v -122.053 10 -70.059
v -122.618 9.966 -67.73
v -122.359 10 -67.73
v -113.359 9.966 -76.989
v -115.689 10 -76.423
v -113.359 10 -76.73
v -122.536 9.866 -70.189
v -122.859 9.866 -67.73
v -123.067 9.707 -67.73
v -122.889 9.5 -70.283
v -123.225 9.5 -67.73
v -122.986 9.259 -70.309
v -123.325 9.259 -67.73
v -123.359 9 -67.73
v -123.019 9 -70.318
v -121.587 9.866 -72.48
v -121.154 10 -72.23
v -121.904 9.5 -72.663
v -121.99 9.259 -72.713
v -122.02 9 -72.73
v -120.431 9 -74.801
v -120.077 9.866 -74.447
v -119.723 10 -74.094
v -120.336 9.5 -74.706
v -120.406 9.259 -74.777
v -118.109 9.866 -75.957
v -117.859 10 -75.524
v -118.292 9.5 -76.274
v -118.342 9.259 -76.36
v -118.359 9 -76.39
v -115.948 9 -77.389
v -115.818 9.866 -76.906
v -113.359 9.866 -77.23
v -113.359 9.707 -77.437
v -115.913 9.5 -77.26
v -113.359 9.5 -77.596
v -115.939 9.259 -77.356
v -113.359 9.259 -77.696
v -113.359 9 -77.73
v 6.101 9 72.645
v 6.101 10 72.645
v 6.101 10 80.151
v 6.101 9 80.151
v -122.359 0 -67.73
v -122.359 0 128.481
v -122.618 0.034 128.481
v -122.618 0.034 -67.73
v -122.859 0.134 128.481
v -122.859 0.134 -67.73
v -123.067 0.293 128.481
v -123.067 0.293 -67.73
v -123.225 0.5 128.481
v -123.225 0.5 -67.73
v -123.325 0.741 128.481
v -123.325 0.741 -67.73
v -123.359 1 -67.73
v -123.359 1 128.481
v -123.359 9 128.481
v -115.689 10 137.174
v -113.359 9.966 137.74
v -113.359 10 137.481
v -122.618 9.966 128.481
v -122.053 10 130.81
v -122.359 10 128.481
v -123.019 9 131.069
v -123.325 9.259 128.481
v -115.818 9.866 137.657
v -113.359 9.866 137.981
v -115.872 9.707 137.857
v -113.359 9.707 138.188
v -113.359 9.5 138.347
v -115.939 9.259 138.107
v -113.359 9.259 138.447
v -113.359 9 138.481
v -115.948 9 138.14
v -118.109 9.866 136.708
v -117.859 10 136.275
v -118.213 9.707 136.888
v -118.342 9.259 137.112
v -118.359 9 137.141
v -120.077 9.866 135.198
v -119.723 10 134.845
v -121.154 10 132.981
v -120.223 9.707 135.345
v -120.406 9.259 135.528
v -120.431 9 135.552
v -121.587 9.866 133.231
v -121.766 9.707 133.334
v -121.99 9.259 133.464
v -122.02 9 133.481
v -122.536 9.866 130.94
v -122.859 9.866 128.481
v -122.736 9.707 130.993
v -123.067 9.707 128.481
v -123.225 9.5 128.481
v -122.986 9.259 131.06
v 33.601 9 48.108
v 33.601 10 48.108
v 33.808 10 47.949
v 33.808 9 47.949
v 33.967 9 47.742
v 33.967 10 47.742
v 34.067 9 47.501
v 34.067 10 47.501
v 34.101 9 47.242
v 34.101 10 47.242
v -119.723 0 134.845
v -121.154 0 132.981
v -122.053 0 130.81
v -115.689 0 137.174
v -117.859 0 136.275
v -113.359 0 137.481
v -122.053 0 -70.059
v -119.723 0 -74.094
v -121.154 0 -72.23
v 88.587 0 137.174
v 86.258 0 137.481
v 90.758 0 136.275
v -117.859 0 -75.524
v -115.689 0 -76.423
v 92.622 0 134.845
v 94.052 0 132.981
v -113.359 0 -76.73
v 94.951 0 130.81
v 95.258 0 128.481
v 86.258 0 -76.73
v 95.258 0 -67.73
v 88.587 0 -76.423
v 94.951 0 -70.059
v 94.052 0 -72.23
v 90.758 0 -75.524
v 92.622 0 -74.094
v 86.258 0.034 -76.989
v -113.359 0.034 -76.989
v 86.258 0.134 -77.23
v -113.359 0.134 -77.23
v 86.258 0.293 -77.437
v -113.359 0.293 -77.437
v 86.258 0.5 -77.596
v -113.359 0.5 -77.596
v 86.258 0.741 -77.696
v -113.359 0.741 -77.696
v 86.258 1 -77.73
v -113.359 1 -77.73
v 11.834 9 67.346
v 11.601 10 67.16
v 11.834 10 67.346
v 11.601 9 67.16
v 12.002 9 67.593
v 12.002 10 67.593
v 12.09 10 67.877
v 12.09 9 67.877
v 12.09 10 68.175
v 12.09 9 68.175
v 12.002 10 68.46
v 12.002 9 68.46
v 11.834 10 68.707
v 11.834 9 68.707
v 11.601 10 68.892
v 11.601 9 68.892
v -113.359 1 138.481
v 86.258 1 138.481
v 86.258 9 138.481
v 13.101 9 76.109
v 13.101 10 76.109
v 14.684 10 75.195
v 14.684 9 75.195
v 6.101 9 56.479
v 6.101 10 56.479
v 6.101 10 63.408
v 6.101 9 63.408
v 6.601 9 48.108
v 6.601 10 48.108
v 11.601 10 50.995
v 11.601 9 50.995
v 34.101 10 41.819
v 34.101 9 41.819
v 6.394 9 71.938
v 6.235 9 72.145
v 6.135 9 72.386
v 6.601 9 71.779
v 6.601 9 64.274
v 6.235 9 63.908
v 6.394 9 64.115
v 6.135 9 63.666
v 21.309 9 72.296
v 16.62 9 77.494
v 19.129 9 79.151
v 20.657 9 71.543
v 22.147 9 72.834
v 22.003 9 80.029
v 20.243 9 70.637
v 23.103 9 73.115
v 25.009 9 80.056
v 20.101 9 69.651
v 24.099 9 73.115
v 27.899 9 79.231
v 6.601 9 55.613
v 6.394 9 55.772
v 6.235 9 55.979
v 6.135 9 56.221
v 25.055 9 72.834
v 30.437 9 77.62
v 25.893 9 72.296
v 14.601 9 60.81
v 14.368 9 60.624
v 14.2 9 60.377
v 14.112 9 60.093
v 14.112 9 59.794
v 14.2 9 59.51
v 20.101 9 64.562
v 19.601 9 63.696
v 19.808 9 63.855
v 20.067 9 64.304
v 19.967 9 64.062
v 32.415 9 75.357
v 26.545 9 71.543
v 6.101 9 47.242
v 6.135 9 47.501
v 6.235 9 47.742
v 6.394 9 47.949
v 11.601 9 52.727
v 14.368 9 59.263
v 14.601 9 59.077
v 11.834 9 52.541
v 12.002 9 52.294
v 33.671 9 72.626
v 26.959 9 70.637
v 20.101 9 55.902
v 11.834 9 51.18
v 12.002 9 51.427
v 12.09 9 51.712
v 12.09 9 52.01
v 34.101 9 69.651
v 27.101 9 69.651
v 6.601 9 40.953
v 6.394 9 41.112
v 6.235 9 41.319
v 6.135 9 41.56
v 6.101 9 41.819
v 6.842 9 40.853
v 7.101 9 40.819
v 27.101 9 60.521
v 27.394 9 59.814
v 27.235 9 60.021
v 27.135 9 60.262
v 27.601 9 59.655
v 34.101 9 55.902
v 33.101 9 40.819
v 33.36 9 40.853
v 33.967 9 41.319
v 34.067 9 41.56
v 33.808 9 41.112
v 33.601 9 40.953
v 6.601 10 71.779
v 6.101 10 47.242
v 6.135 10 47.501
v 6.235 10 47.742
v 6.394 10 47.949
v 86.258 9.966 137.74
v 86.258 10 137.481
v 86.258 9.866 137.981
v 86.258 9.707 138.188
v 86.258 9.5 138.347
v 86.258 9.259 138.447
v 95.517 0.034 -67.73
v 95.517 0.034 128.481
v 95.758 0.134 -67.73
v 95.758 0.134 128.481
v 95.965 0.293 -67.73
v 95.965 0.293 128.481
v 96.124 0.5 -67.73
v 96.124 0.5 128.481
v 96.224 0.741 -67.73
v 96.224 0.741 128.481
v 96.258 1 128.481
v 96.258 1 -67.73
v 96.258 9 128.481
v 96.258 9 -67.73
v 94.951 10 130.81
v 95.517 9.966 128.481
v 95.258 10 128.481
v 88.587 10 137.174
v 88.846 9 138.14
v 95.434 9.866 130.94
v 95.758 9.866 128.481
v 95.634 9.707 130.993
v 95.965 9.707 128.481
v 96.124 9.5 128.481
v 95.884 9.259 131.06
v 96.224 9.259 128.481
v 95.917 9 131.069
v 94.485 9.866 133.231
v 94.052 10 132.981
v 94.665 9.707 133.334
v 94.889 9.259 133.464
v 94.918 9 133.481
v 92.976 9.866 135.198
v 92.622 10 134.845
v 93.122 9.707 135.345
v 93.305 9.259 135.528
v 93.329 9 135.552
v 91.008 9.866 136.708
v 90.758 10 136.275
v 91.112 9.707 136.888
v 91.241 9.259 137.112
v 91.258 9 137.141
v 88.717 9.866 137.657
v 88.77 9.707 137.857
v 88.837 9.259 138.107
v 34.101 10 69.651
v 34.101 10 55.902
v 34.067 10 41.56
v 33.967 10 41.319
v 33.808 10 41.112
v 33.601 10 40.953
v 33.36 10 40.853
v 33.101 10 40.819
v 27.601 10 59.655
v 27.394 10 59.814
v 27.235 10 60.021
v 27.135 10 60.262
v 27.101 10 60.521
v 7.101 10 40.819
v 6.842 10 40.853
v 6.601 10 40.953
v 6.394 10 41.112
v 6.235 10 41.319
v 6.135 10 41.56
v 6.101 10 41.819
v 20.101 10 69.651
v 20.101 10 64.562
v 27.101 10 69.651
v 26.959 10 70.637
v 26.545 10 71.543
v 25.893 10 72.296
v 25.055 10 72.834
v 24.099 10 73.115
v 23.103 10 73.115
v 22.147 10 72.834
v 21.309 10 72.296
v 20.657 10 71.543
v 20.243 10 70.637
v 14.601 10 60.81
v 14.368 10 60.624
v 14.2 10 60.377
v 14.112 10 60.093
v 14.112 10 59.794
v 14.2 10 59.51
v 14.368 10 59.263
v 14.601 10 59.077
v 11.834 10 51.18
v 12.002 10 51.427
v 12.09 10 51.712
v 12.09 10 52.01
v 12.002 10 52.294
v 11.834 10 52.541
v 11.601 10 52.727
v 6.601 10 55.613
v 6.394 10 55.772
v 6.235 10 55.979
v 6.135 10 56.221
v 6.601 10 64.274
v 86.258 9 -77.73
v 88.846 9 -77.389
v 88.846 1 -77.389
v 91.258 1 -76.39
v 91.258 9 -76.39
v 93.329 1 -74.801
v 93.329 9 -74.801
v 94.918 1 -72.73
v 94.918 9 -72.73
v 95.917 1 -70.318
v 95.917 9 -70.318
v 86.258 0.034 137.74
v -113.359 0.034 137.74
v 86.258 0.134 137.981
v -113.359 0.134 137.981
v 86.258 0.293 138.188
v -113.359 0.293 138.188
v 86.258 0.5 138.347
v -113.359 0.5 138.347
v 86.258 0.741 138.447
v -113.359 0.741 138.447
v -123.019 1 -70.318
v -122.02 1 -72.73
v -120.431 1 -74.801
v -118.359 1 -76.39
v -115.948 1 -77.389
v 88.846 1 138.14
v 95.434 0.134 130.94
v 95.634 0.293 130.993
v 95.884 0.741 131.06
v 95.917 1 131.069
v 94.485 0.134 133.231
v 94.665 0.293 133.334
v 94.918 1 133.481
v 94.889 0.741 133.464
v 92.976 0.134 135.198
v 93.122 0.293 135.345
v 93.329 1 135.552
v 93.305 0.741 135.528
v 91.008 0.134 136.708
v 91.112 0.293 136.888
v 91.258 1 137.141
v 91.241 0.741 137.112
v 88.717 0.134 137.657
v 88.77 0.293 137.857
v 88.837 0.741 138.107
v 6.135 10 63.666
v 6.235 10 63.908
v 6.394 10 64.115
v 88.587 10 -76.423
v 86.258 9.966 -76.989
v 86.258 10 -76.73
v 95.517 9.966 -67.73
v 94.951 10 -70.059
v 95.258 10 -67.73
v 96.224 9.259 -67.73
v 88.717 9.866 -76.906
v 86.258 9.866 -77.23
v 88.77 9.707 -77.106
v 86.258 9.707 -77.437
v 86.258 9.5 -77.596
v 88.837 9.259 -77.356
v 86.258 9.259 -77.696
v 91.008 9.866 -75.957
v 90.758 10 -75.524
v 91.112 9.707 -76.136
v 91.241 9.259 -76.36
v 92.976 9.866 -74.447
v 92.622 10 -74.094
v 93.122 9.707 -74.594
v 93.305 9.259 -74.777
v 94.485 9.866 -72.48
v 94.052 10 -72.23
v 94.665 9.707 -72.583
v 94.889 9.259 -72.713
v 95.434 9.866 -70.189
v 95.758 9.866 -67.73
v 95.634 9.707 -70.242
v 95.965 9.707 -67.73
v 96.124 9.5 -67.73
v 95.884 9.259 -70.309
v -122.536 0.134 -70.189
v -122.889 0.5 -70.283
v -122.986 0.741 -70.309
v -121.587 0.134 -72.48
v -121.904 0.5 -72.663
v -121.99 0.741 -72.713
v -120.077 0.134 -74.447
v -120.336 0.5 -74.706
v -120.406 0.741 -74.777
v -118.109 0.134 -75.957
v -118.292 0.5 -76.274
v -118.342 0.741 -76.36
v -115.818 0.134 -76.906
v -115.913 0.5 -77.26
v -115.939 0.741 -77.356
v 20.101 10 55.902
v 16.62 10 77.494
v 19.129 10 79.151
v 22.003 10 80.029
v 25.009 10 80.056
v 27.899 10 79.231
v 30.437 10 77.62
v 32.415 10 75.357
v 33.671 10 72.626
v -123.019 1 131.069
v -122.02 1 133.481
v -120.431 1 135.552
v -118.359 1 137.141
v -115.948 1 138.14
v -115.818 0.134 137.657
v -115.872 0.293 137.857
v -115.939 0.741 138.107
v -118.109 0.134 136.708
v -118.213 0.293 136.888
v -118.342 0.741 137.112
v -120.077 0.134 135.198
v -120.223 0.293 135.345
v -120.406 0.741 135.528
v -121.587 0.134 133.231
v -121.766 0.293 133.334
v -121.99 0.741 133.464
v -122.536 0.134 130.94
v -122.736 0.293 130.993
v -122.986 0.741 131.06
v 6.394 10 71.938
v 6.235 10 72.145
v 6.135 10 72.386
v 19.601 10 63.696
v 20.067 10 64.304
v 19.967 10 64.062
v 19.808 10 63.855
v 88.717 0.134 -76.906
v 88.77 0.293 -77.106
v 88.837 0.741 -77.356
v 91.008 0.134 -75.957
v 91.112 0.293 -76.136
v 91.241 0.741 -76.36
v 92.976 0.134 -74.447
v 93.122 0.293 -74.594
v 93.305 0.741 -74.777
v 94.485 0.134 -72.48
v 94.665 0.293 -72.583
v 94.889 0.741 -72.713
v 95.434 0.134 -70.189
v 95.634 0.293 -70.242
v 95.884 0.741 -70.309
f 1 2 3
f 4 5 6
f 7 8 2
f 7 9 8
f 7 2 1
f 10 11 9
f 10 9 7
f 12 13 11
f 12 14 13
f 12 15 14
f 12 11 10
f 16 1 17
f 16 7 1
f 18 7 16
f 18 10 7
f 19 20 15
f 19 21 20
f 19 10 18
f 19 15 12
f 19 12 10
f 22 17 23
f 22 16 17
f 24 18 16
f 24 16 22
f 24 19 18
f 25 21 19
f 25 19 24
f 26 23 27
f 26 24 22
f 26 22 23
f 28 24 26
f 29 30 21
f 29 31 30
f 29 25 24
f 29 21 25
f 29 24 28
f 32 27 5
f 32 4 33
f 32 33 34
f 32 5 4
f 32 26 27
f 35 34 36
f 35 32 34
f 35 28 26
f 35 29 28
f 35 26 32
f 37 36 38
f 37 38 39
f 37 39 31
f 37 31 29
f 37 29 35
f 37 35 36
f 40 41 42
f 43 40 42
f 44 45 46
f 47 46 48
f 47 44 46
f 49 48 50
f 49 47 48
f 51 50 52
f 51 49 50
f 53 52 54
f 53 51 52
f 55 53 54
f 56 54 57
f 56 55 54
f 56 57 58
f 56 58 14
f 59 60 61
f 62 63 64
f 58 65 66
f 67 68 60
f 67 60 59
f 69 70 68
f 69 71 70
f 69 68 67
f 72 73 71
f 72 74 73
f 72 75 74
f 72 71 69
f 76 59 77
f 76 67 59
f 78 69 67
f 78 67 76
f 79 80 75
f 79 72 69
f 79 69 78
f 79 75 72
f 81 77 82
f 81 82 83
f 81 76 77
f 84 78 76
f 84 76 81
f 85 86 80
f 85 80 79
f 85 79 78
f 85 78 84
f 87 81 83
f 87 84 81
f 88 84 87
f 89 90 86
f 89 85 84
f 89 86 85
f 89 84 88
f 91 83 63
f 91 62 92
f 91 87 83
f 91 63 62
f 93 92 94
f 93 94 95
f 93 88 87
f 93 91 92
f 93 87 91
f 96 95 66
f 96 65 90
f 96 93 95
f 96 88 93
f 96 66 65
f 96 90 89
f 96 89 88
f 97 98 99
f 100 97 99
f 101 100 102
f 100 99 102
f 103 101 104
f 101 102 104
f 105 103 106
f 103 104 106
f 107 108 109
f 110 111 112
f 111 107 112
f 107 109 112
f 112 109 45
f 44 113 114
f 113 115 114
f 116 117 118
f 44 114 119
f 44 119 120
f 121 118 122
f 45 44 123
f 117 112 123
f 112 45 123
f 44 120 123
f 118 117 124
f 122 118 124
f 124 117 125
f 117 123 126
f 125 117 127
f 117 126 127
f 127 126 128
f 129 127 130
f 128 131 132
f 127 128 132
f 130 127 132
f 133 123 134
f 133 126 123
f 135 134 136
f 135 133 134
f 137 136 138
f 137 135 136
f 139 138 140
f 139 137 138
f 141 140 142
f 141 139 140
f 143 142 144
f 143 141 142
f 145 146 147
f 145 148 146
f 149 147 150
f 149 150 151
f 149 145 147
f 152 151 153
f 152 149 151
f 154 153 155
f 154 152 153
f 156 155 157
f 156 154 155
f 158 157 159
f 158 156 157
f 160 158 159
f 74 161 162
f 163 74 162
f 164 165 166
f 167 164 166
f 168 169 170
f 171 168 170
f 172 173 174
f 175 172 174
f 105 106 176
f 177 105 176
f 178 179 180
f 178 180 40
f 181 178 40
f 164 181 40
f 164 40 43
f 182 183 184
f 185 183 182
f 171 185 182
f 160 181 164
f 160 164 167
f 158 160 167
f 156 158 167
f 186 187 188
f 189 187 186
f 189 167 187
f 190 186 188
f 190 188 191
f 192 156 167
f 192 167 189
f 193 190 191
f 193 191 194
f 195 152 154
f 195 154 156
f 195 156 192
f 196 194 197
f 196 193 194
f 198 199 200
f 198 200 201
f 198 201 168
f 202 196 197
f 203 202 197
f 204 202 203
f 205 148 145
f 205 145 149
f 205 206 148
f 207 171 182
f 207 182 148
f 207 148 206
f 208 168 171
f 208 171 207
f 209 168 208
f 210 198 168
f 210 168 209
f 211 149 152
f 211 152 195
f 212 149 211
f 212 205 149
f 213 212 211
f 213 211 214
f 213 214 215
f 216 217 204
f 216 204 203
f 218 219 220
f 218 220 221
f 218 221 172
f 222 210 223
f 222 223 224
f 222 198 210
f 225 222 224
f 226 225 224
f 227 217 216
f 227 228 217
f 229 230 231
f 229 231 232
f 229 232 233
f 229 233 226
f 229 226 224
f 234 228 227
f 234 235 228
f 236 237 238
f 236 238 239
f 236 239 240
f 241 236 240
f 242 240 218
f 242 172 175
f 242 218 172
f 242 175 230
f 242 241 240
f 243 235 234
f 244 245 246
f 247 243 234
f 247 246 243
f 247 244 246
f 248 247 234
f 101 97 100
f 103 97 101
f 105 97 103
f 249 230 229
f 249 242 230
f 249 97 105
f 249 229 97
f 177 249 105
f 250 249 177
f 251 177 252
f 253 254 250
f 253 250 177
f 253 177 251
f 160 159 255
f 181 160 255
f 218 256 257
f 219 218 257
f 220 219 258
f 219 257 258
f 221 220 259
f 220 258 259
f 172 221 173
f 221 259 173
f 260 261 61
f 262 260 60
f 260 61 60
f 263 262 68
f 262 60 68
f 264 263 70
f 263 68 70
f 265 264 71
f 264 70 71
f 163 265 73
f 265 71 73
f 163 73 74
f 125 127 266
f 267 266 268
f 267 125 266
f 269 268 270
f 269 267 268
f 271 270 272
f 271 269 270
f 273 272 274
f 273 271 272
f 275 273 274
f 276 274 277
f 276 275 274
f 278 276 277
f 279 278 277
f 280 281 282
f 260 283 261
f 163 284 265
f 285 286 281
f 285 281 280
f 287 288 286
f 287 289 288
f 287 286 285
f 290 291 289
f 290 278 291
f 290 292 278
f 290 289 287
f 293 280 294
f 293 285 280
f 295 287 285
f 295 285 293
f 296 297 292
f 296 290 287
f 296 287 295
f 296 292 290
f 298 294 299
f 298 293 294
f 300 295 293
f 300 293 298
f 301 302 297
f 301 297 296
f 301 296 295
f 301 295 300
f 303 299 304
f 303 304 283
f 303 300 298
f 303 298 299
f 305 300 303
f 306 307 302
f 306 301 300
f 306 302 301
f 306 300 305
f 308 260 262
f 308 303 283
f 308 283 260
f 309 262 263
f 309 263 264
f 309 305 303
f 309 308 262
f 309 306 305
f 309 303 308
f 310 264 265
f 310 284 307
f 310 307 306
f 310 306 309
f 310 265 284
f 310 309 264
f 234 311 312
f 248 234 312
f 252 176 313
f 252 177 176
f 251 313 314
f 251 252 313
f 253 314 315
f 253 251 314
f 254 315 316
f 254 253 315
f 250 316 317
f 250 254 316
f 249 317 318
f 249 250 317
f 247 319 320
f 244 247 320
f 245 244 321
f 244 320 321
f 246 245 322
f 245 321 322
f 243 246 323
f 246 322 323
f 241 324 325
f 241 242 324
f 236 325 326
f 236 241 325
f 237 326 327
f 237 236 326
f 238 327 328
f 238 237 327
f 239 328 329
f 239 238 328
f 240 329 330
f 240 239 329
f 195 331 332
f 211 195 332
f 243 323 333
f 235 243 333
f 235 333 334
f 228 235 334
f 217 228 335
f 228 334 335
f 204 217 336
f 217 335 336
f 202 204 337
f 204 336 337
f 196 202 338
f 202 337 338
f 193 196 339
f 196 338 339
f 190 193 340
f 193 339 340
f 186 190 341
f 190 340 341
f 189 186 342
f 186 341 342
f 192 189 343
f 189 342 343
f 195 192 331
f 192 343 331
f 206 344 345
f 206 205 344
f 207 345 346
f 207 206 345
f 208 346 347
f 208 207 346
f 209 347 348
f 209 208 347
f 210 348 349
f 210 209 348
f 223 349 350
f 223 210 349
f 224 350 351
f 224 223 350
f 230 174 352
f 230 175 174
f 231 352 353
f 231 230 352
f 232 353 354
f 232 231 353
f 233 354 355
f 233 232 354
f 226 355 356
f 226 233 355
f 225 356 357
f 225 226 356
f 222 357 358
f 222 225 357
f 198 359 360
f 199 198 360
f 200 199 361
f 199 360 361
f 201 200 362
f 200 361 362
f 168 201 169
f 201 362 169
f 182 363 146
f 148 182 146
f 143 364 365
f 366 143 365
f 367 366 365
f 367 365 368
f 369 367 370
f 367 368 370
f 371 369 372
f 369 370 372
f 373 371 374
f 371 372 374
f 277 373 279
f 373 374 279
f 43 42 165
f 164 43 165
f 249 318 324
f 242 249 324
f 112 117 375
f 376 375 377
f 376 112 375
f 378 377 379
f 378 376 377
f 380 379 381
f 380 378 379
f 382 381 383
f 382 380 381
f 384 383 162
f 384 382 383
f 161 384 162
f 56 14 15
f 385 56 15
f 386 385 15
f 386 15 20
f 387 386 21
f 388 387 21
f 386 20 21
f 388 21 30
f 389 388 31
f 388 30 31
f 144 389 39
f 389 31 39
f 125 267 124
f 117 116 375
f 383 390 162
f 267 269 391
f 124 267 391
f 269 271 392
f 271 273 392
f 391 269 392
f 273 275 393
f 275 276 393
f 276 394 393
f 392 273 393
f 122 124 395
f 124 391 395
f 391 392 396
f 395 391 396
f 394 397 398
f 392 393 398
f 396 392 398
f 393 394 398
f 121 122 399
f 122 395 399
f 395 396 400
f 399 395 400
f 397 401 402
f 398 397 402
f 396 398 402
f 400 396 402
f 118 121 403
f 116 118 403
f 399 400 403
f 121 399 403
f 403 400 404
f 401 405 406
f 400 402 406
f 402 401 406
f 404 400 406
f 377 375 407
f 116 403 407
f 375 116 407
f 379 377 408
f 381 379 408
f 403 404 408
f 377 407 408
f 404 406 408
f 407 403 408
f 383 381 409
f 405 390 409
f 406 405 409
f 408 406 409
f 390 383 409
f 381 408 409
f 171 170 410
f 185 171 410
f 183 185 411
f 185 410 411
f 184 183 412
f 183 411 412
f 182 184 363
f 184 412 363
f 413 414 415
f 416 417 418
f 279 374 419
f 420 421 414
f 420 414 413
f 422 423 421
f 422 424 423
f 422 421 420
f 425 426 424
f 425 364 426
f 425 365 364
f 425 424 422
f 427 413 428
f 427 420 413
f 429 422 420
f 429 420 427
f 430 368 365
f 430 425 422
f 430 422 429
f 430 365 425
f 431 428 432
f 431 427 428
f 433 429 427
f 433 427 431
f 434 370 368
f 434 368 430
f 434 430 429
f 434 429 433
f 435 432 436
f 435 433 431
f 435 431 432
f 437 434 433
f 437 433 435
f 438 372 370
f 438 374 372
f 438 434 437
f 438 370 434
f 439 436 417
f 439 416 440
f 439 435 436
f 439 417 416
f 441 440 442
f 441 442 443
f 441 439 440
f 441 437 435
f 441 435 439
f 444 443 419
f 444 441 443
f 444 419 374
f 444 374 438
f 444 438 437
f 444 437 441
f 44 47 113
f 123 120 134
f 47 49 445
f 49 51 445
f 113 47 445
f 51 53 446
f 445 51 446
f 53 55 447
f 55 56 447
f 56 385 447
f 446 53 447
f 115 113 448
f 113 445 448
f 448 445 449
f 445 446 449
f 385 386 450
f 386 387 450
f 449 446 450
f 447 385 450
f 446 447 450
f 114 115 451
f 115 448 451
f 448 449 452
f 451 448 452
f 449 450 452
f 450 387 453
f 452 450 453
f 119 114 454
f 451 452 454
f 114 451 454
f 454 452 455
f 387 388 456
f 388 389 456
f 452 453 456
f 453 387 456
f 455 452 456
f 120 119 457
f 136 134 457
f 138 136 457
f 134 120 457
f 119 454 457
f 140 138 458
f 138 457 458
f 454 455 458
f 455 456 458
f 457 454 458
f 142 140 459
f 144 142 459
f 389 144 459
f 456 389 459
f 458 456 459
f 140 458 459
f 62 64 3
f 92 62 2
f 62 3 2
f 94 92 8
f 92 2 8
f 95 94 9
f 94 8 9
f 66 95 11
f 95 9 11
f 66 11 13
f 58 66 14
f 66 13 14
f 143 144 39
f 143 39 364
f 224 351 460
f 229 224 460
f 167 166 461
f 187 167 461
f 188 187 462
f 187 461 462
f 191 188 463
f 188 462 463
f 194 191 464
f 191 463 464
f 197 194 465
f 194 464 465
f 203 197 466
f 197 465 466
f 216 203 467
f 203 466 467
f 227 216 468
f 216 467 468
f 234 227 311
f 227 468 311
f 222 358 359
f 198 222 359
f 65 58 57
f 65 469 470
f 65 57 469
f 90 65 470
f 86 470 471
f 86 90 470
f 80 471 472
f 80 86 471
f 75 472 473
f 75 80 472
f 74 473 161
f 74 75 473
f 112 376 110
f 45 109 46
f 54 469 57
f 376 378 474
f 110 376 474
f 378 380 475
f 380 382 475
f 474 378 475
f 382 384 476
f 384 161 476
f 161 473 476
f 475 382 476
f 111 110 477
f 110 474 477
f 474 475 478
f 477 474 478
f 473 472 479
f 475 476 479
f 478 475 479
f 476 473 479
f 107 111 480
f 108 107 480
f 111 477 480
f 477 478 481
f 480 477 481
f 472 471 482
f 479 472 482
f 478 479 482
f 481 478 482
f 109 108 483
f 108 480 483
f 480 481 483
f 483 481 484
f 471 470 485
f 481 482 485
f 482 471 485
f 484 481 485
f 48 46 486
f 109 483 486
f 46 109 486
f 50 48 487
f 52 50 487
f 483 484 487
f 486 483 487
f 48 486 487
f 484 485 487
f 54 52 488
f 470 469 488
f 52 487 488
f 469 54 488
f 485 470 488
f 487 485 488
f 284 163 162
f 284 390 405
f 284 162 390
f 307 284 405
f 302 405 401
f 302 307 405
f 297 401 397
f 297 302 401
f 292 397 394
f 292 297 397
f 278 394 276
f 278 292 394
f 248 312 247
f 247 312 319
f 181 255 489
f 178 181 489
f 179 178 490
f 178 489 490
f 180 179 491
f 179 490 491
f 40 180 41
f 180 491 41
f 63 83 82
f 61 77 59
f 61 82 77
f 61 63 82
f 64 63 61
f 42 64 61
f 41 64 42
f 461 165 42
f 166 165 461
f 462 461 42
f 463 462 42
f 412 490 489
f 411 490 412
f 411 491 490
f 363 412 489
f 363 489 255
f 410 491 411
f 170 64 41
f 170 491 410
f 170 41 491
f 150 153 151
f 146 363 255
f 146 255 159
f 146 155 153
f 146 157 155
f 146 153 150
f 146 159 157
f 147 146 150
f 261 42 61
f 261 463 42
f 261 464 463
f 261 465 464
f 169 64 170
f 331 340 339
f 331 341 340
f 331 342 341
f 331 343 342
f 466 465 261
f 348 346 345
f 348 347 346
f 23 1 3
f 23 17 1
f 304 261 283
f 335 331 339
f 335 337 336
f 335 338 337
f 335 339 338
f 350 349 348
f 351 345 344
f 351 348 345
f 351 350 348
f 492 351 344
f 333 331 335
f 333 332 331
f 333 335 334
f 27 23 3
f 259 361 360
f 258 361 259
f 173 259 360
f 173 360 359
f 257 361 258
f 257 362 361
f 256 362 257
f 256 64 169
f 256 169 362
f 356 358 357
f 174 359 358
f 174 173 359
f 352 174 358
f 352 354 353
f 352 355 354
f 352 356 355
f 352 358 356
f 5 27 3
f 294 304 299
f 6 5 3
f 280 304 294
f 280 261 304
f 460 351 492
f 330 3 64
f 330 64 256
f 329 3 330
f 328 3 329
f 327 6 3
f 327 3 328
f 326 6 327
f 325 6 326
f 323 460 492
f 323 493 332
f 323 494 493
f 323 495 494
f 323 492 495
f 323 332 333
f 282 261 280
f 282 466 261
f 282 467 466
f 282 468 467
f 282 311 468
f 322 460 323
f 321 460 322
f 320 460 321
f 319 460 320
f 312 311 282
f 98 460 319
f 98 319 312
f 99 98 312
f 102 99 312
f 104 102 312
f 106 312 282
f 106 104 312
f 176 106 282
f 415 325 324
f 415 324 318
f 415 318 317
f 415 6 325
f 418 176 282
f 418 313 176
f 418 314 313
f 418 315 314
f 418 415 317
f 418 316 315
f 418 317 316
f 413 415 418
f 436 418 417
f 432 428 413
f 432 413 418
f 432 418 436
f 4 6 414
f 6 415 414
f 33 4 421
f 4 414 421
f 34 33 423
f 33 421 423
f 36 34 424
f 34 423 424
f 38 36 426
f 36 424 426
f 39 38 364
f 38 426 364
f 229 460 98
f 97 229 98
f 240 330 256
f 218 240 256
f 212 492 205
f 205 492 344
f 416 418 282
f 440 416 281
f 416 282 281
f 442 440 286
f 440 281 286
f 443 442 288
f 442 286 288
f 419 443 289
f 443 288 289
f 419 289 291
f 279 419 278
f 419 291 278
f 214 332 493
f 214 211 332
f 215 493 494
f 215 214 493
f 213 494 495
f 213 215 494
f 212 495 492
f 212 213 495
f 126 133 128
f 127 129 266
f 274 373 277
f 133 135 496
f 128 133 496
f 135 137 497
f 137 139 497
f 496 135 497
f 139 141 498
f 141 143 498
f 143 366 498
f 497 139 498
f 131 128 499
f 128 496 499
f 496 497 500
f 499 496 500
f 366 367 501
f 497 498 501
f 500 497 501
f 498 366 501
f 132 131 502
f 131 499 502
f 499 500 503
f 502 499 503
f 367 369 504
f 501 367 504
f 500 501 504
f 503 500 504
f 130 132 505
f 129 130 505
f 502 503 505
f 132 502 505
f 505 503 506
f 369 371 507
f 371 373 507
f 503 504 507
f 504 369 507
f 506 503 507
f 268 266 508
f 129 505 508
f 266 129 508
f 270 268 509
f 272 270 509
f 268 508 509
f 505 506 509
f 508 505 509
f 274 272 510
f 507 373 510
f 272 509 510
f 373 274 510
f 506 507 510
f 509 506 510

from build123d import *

# Parameters (mm, degrees)
SKETCH1_W           = 219.61751697
SKETCH1_H           = 216.210653226
BOSS_EXTRUDE1_DEPTH = 10
CUT_EXTRUDE1_DEPTH  = 1
FILLET3_R           = 10
FILLET4_R           = 1


with BuildPart() as part:
    # Sketch1 → Boss-Extrude1 (new body)
    with BuildSketch(Plane(origin=(0, 0, 0), x_dir=(1, 0, 0), z_dir=(0, 1, 0))):
        with Locations((-13.550693969, -30.37560711)):
            Rectangle(SKETCH1_W, SKETCH1_H)
    extrude(amount=BOSS_EXTRUDE1_DEPTH)

    # Sketch2 → Cut-Extrude1 (cut)
    with BuildSketch(Plane(origin=(0, 10, 0), x_dir=(1, 0, 0), z_dir=(0, 1, 0))):
        with BuildLine():
            Line((34.100948693, -47.24181379), (34.100948693, -40.819164059))
            Line((34.100948693, -40.819164059), (6.100948693, -40.819164059))
            Line((6.100948693, -40.819164059), (6.100948693, -47.24181379))
            ThreePointArc((6.100948693, -47.24181379), (6.234923289, -47.74181379), (6.600948693, -48.107839194))
            Line((6.600948693, -48.107839194), (13.100948693, -51.860615944))
            Line((13.100948693, -51.860615944), (20.100948693, -55.902067828))
            Line((20.100948693, -55.902067828), (33.600948693, -48.107839194))
            ThreePointArc((33.600948693, -48.107839194), (33.966974097, -47.74181379), (34.100948693, -47.24181379))
        make_face()
        with BuildLine():
            Line((13.100948693, -59.943519712), (20.100948693, -55.902067828))
            Line((20.100948693, -55.902067828), (13.100948693, -51.860615944))
            Line((13.100948693, -51.860615944), (6.600948693, -55.613392693))
            ThreePointArc((6.600948693, -55.613392693), (6.234923289, -55.979418097), (6.100948693, -56.479418097))
            Line((6.100948693, -56.479418097), (6.100948693, -63.407621327))
            ThreePointArc((6.100948693, -63.407621327), (6.234923289, -63.907621327), (6.600948693, -64.273646731))
            Line((6.600948693, -64.273646731), (13.100948693, -68.026423481))
            Line((13.100948693, -68.026423481), (20.100948693, -63.984971597))
            Line((20.100948693, -63.984971597), (13.100948693, -59.943519712))
        make_face()
        with BuildLine():
            Line((20.100948693, -69.650779134), (20.100948693, -63.984971597))
            Line((20.100948693, -63.984971597), (13.100948693, -68.026423481))
            Line((13.100948693, -68.026423481), (6.600948693, -71.779200231))
            ThreePointArc((6.600948693, -71.779200231), (6.234923289, -72.145225634), (6.100948693, -72.645225634))
            Line((6.100948693, -72.645225634), (6.100948693, -80.150779134))
            Line((6.100948693, -80.150779134), (13.100948693, -76.10932725))
            Line((13.100948693, -76.10932725), (13.100948693, -69.650779134))
            ThreePointArc((13.100948693, -69.650779134), (13.504510857, -72.533823188), (14.684175934, -75.195250576))
            ThreePointArc((14.684175934, -75.195250576), (26.483992747, -79.74721697), (34.100948693, -69.650779134))
            Line((34.100948693, -69.650779134), (34.100948693, -55.902067828))
            Line((34.100948693, -55.902067828), (27.600948693, -59.654844578))
            ThreePointArc((27.600948693, -59.654844578), (27.234923289, -60.020869982), (27.100948693, -60.520869982))
            Line((27.100948693, -60.520869982), (27.100948693, -69.650779134))
            ThreePointArc((27.100948693, -69.650779134), (23.600948693, -73.150779134), (20.100948693, -69.650779134))
        make_face()
        with BuildLine():
            Line((13.100948693, -69.650779134), (13.100948693, -76.10932725))
            Line((13.100948693, -76.10932725), (14.684175934, -75.195250576))
            ThreePointArc((14.684175934, -75.195250576), (13.504510857, -72.533823188), (13.100948693, -69.650779134))
        make_face()
    extrude(amount=-CUT_EXTRUDE1_DEPTH, mode=Mode.SUBTRACT)

    # Fillet3
    fillet3_edges = [part.edges().sort_by_distance(p)[0] for p in [
        (-123.359452454, 5, -77.729719503),
        (96.258064516, 5, -77.729719503),
        (96.258064516, 5, 138.480933723),
        (-123.359452454, 5, 138.480933723),
    ]]
    fillet(fillet3_edges, radius=FILLET3_R)

    # Fillet4
    fillet4_edges = [part.edges().sort_by_distance(p)[0] for p in [
        (13.100948693, 9.5, 68.026423481),
        (13.100948693, 9.5, 51.860615944),
        (6.100948693, 9.5, 40.819164059),
        (34.100948693, 9.5, 40.819164059),
        (13.100948693, 9.5, 59.943519712),
        (20.100948693, 9.5, 63.984971597),
        (-13.550693969, 0, -77.729719503),
        (-13.550693969, 10, -77.729719503),
        (-123.359452454, 0, 30.37560711),
        (96.258064516, 0, 30.37560711),
        (-13.550693969, 0, 138.480933723),
        (93.329132328, 0, 135.552001535),
        (-120.430520266, 0, 135.552001535),
        (-120.430520266, 0, -74.800787315),
        (93.329132328, 0, -74.800787315),
        (96.258064516, 10, 30.37560711),
        (-123.359452454, 10, 30.37560711),
        (-13.550693969, 10, 138.480933723),
        (93.329132328, 10, 135.552001535),
        (-120.430520266, 10, 135.552001535),
        (-120.430520266, 10, -74.800787315),
        (93.329132328, 10, -74.800787315),
    ]]
    fillet(fillet4_edges, radius=FILLET4_R)


solid = part.part
